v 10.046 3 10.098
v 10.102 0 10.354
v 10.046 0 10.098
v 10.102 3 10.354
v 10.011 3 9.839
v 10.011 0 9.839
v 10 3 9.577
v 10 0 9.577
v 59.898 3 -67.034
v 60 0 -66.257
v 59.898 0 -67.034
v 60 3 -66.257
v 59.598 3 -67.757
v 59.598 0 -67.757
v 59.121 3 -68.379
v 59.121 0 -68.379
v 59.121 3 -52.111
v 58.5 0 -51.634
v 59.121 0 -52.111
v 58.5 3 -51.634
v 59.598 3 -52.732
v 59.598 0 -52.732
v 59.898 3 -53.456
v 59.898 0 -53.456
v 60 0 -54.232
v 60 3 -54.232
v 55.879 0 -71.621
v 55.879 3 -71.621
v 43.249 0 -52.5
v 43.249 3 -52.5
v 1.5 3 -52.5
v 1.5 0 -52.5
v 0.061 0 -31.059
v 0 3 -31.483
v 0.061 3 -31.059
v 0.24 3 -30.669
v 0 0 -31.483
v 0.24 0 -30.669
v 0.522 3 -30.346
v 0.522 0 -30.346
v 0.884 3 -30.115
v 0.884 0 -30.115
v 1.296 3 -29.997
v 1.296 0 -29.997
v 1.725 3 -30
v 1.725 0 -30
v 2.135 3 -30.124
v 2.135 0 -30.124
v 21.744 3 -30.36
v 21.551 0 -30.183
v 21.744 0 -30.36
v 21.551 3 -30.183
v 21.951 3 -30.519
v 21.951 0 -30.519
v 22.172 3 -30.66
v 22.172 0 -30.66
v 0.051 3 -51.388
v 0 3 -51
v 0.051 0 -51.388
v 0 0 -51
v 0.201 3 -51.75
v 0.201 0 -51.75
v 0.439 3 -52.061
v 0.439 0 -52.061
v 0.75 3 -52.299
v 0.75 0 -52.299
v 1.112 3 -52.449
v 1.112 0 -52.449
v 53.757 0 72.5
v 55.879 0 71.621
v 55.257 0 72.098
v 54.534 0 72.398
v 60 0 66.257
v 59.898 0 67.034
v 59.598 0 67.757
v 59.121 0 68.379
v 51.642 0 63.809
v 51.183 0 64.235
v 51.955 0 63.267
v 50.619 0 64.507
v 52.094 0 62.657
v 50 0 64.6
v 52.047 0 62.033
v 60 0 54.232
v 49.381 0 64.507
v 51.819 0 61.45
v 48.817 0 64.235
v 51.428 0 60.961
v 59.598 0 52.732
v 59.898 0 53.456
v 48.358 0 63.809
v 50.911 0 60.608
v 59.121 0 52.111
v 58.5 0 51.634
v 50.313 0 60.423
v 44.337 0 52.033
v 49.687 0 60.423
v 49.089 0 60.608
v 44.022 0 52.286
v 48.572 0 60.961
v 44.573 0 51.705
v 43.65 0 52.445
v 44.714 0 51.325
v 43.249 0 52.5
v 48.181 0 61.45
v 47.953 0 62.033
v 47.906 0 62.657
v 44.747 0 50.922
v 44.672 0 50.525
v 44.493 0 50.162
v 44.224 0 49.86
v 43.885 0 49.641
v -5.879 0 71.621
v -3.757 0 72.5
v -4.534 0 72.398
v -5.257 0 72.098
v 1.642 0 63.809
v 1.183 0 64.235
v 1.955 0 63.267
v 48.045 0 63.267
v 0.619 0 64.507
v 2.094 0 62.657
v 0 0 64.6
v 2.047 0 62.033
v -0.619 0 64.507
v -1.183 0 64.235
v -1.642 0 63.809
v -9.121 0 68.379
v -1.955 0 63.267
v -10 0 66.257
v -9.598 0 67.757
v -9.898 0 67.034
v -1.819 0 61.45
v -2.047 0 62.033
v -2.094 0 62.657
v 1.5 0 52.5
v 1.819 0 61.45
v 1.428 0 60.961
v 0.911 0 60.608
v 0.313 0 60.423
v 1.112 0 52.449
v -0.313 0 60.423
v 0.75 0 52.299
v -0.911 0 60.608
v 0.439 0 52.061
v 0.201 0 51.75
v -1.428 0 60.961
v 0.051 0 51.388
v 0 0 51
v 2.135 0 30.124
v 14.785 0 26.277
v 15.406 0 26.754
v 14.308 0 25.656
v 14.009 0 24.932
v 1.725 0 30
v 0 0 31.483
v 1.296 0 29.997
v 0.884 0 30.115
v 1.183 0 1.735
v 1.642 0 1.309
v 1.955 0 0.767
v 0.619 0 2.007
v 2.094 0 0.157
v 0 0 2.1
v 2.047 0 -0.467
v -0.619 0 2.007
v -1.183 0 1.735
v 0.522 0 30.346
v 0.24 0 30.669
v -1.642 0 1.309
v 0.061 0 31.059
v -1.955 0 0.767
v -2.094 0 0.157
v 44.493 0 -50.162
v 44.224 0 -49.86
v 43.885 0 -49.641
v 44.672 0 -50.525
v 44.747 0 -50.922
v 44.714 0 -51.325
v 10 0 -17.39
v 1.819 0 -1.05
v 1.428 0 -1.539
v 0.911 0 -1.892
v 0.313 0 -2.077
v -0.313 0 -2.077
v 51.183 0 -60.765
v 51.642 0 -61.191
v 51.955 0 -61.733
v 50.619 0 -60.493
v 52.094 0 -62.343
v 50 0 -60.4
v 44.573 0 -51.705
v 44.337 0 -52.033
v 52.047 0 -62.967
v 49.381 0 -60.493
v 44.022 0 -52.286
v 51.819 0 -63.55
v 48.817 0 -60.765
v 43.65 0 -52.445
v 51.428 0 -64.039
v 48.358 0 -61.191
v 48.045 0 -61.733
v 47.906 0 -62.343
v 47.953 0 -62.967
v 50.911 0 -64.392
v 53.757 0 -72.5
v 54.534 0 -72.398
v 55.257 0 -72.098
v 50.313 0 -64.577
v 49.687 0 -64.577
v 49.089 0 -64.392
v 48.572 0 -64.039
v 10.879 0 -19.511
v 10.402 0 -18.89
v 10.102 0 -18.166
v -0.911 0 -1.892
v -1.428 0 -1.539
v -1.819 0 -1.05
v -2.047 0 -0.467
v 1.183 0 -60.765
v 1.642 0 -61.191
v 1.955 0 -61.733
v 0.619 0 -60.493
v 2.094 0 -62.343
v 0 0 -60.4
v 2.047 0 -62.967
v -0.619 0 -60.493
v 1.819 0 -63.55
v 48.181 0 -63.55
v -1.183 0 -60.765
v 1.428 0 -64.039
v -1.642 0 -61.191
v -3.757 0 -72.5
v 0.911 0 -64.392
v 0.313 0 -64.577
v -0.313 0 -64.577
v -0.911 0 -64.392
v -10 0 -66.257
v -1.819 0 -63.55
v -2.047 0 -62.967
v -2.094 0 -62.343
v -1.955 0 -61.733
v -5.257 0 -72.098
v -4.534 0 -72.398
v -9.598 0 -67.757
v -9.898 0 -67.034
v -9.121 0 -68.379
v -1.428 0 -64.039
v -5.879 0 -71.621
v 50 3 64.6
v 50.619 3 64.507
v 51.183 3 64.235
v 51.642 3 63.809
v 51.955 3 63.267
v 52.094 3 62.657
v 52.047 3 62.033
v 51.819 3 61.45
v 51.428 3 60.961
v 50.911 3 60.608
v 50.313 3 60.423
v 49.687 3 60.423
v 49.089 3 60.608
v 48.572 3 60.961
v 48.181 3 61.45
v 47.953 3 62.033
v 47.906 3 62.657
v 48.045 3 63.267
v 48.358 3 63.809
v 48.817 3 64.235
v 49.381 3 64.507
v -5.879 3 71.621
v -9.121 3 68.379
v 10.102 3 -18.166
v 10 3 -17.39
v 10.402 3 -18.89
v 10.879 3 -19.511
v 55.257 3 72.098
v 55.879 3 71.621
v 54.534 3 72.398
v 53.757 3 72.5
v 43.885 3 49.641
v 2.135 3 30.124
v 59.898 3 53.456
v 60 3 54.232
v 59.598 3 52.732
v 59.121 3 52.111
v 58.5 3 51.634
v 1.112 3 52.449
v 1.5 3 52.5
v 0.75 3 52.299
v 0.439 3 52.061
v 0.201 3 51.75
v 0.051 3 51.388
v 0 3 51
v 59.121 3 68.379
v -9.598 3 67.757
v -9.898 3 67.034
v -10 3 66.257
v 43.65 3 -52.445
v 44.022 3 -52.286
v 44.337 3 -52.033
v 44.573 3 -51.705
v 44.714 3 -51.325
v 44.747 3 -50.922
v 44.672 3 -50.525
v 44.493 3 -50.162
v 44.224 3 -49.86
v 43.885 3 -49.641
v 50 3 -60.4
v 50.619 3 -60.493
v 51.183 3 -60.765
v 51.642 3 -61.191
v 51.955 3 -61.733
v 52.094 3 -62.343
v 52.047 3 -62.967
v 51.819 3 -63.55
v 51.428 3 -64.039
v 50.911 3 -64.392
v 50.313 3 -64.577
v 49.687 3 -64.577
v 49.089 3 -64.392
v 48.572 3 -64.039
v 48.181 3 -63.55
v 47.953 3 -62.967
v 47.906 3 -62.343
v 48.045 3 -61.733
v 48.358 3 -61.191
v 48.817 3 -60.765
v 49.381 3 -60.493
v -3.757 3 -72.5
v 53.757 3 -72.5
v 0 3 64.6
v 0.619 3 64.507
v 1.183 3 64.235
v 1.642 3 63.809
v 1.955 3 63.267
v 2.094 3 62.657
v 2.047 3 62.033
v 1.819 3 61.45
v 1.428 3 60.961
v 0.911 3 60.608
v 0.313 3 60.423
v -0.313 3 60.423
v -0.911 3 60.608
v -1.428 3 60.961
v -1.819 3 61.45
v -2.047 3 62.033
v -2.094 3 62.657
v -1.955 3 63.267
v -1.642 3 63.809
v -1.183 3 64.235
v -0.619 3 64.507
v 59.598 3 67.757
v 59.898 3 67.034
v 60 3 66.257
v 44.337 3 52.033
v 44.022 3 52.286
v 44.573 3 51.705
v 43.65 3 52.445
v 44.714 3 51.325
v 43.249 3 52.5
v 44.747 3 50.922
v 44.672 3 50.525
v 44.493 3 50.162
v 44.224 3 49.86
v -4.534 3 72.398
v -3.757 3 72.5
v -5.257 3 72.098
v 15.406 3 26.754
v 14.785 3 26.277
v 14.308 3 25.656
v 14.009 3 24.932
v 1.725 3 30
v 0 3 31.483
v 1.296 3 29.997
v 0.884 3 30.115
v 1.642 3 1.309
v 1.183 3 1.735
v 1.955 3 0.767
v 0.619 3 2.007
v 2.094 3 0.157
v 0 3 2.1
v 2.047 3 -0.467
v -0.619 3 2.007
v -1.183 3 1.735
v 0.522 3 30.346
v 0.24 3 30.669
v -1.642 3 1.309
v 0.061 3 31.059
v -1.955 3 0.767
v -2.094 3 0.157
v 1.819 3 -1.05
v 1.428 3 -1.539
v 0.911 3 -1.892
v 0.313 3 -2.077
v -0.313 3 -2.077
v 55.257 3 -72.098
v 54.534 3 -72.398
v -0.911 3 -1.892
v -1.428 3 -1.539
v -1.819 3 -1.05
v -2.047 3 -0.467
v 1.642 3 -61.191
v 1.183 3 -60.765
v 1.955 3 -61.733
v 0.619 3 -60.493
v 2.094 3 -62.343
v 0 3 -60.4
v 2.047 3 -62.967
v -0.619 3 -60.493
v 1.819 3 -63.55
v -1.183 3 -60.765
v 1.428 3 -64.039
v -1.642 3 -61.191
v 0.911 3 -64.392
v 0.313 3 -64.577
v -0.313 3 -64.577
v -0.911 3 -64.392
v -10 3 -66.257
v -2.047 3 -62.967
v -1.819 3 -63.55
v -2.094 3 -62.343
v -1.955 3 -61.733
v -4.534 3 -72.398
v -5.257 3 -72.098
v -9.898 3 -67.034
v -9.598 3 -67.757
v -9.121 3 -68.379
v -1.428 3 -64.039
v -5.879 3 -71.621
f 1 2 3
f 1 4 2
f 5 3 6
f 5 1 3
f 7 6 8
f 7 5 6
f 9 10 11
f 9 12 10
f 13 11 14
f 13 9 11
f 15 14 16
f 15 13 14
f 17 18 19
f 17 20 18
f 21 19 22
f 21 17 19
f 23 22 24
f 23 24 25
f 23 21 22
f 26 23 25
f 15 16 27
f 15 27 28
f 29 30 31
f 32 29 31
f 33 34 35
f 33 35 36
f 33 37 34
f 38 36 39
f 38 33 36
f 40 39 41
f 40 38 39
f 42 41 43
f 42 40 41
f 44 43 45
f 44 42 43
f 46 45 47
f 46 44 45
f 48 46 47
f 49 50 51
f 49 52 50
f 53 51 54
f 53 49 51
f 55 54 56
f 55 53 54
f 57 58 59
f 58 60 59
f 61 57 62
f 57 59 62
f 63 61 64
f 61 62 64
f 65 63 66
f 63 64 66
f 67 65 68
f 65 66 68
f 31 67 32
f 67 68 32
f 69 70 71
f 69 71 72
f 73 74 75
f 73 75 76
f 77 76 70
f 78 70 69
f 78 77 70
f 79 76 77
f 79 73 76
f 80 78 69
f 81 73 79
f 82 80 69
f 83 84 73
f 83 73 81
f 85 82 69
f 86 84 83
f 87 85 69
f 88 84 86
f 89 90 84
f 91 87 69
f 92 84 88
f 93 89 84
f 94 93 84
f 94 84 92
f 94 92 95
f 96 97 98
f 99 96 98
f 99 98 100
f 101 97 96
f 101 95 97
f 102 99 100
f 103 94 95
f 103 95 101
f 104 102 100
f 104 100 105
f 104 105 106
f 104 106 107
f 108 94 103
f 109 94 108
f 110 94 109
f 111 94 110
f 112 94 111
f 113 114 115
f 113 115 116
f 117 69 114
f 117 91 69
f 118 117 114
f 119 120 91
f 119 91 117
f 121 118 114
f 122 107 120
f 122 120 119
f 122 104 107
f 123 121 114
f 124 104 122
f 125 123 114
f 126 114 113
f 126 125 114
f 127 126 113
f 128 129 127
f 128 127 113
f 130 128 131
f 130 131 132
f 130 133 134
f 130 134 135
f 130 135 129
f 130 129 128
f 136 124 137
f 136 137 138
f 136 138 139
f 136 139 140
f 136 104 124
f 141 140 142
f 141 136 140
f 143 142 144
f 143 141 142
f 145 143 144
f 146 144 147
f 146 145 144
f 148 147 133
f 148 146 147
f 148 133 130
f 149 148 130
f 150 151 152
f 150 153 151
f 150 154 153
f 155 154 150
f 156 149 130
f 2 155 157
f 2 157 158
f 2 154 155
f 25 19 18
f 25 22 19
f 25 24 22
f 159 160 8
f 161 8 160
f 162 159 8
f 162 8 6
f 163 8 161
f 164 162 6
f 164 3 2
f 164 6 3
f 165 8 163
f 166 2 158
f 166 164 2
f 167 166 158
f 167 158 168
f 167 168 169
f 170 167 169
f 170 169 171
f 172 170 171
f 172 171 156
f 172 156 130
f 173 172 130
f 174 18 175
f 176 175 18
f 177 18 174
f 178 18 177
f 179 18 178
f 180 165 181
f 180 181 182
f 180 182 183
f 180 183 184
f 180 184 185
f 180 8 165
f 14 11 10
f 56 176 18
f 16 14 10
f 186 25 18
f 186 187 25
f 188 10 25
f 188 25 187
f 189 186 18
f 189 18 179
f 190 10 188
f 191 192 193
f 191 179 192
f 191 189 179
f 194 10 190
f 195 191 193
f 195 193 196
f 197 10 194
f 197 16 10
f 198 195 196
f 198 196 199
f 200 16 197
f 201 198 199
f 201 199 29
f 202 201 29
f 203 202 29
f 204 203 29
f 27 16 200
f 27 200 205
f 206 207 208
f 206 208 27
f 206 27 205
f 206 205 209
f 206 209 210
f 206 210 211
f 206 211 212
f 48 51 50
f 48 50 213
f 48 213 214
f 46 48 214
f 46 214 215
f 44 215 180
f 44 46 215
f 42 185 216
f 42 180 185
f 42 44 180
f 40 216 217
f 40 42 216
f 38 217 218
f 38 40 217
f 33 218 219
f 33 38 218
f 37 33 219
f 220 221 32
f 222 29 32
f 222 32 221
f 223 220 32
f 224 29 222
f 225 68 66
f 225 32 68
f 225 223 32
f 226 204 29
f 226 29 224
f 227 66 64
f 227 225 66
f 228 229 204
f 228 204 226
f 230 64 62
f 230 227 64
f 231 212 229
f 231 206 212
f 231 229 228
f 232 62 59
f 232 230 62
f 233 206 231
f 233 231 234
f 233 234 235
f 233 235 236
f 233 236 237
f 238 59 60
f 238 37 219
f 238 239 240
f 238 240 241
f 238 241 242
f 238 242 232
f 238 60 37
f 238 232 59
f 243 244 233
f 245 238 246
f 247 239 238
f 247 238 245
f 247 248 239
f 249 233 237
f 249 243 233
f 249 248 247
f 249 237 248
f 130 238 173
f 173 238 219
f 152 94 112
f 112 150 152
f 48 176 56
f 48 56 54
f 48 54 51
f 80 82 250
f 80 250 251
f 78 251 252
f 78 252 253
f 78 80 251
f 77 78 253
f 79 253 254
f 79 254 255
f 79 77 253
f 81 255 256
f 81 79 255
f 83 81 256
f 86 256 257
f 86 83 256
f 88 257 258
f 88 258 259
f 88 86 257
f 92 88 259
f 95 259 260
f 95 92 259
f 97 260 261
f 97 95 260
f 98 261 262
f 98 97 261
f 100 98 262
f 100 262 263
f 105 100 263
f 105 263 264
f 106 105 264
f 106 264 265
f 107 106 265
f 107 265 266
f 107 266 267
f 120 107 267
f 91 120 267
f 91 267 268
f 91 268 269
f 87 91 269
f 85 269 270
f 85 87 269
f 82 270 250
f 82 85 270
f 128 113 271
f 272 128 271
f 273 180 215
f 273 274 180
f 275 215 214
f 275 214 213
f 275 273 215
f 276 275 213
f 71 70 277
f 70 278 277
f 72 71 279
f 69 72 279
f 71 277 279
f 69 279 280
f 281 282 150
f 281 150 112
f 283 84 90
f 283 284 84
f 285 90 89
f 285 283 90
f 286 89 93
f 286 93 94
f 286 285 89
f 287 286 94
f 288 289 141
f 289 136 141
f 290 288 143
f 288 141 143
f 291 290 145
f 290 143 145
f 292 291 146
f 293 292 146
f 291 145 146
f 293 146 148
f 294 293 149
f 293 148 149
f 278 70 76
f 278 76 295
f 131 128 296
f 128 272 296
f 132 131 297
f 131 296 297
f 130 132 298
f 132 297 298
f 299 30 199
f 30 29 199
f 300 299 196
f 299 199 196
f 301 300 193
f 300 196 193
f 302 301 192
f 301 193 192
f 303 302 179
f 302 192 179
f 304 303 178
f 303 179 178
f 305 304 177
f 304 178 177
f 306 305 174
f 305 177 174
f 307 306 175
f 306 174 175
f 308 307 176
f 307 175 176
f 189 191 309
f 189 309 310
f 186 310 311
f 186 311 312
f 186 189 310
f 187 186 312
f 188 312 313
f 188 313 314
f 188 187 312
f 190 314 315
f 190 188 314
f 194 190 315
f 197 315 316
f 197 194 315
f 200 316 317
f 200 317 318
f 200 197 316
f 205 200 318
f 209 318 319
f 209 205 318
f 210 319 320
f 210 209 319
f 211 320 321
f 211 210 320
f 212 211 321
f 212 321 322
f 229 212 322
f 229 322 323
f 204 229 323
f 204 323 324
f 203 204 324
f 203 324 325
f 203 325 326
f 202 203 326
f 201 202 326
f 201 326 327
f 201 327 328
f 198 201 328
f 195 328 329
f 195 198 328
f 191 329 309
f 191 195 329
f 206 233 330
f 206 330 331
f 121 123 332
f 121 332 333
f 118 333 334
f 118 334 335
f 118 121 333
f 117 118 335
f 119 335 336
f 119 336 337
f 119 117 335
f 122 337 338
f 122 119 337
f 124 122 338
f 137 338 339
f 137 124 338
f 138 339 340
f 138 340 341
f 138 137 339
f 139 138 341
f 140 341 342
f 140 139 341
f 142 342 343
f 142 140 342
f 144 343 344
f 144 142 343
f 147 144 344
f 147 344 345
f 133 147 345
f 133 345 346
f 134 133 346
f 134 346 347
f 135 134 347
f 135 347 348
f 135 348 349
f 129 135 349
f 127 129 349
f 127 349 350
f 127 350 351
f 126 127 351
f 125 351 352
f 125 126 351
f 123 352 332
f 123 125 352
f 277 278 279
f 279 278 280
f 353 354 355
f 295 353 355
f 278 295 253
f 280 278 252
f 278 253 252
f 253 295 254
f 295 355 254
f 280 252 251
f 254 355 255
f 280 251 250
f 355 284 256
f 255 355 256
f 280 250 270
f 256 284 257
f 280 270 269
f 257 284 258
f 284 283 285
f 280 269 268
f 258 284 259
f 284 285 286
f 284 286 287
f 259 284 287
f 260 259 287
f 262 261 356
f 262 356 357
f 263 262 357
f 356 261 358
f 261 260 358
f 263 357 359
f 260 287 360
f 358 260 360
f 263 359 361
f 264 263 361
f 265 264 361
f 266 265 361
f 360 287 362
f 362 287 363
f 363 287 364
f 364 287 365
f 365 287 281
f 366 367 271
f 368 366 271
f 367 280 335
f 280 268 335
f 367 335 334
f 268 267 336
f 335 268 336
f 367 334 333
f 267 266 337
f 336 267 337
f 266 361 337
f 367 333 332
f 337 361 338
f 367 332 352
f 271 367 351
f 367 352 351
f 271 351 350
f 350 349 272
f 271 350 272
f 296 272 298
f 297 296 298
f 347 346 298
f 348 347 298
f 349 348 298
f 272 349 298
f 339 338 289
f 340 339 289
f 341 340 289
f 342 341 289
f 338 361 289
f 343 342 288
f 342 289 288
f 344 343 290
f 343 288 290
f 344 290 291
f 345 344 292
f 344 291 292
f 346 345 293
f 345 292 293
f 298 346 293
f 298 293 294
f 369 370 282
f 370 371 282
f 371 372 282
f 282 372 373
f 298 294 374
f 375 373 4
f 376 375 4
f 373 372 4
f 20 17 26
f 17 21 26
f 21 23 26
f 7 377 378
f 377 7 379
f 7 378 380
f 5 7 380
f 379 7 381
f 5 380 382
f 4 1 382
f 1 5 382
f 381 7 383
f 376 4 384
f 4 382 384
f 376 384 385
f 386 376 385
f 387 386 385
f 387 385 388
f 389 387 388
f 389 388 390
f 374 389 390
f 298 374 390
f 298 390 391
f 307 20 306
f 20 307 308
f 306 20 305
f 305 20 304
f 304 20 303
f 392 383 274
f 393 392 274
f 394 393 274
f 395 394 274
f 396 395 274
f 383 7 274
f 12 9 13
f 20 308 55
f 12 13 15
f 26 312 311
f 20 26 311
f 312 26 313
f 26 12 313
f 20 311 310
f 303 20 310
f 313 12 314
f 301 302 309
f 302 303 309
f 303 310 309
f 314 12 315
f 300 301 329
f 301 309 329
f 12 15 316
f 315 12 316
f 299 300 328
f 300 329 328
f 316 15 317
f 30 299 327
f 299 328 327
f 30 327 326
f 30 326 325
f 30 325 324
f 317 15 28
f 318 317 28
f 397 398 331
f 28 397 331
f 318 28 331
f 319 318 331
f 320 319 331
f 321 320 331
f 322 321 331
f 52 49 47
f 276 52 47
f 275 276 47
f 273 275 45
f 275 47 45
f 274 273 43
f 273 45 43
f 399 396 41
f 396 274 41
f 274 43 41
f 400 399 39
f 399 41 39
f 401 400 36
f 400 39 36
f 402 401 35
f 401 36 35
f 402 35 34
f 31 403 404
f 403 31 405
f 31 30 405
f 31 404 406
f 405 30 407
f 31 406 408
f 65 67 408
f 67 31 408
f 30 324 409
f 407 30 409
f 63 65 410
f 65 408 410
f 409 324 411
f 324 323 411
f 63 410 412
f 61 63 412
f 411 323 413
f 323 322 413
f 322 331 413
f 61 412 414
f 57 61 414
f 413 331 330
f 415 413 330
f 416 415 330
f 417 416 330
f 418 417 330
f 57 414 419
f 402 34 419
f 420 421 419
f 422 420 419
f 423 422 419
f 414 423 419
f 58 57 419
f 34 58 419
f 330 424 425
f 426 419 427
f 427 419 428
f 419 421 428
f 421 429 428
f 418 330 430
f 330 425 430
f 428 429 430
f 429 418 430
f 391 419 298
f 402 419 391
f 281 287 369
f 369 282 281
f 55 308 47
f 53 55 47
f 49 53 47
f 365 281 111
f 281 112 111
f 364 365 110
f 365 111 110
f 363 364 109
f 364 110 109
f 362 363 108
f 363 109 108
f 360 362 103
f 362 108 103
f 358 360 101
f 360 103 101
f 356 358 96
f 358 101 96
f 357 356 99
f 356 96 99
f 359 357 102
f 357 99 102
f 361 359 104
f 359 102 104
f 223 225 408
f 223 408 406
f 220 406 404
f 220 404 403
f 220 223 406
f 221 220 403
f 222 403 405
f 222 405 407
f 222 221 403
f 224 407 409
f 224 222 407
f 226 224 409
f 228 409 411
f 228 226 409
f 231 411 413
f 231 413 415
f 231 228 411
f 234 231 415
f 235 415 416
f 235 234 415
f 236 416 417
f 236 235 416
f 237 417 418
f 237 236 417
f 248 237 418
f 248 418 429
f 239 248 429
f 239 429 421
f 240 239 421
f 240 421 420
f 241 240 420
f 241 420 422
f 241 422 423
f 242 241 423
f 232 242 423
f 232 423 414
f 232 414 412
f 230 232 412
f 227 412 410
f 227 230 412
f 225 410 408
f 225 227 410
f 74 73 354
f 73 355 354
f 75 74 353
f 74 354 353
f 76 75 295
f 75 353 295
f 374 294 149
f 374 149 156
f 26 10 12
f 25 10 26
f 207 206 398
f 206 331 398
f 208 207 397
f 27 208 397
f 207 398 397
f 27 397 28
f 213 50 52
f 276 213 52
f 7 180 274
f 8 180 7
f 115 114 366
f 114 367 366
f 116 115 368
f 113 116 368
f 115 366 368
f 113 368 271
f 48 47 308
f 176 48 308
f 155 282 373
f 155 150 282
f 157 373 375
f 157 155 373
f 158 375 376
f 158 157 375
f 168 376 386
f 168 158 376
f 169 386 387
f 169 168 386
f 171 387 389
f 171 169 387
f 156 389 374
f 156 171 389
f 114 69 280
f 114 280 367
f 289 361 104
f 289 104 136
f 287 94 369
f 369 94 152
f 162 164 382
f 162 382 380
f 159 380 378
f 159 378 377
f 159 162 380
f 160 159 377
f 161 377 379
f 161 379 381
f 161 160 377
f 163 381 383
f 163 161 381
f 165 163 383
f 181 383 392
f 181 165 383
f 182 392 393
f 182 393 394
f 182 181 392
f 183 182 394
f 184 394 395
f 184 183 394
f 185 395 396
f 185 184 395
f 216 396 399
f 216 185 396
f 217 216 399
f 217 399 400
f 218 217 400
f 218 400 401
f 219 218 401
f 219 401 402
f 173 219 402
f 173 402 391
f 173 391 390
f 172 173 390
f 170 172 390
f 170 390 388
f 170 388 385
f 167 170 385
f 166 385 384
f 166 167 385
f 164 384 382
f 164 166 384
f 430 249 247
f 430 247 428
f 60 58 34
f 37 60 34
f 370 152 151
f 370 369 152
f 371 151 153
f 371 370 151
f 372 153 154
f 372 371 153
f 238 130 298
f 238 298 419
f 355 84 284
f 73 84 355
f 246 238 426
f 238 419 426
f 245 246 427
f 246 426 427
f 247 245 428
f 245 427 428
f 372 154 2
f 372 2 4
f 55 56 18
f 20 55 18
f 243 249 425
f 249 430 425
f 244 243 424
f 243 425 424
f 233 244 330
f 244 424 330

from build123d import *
from OCP.BRepFilletAPI import BRepFilletAPI_MakeChamfer

# Parameters (mm, degrees)
SKETCH_1_R          = 2.1
EXTRUDE_1_DEPTH     = 3
CHAMFER_1_SIZE      = 5
CHAMFER_1_SIZE2     = 13.660254038
FILLET_1_R          = 3
CUT_EXTRUDE_1_DEPTH = 10
FILLET_2_R          = 1.5


with BuildPart() as part:
    # 草图1 → 凸台-拉伸1 (new body)
    # profile 1 of 3: a face of its own
    with BuildSketch(Plane(origin=(0, 0, 0), x_dir=(1, 0, 0), z_dir=(0, 1, 0))):
        Polygon((10, 52.5), (10, 23.632486541), (60, 52.5), align=None)
    # profile 2 of 3: a face of its own
    with BuildSketch(Plane(origin=(0, 0, 0), x_dir=(1, 0, 0), z_dir=(0, 1, 0))):
        Polygon((10, -23.632486541), (10, -52.5), (60, -52.5), align=None)
    # profile 3 of 3: a face of its own
    with BuildSketch(Plane(origin=(0, 0, 0), x_dir=(1, 0, 0), z_dir=(0, 1, 0))):
        Polygon((60, -52.5), (60, -72.5), (-10, -72.5), (-10, 72.5), (60, 72.5), (60, 52.5), (10, 52.5), (10, -52.5), align=None)
        with Locations(Location((50, -62.5, 0), (0, 0, 270))):
            Circle(SKETCH_1_R, mode=Mode.SUBTRACT)
        with Locations(Location((0, 0, 0), (0, 0, 270))):
            Circle(SKETCH_1_R, mode=Mode.SUBTRACT)
        with Locations(Location((50, 62.5, 0), (0, 0, 270))):
            Circle(SKETCH_1_R, mode=Mode.SUBTRACT)
        with Locations(Location((0, 62.5, 0), (0, 0, 270))):
            Circle(SKETCH_1_R, mode=Mode.SUBTRACT)
        with Locations(Location((0, -62.5, 0), (0, 0, 270))):
            Circle(SKETCH_1_R, mode=Mode.SUBTRACT)
    extrude(amount=EXTRUDE_1_DEPTH)

    # 倒角1: one chamfer whose edges measure the first distance from different faces: ONE call of the kernel's chamfer builder (chamfer() names one face for all edges)
    chamfer_1_edges_1 = [part.edges().sort_by_distance(p)[0] for p in [
        (60, 1.5, 72.5),
        (-10, 1.5, 72.5),
        (-10, 1.5, -72.5),
        (60, 1.5, -72.5),
    ]]
    chamfer_1_edges_2 = [part.edges().sort_by_distance(p)[0] for p in [
        (10, 1.5, -23.632486541),
    ]]
    chamfer_1_side_2 = [part.faces().sort_by_distance(p)[0] for p in [
        (10, 1.5, 0),
    ]]
    chamfer_1_edges_3 = [part.edges().sort_by_distance(p)[0] for p in [
        (10, 1.5, 23.632486541),
    ]]
    chamfer_1_side_3 = [part.faces().sort_by_distance(p)[0] for p in [
        (35, 1.5, 38.06624327),
    ]]
    chamfer_1 = BRepFilletAPI_MakeChamfer(part.part.solid().wrapped)
    for e in chamfer_1_edges_1:
        chamfer_1.Add(CHAMFER_1_SIZE, e.wrapped)
    for e in chamfer_1_edges_2:
        chamfer_1.Add(CHAMFER_1_SIZE, CHAMFER_1_SIZE2, e.wrapped, chamfer_1_side_2[0].wrapped)  # the first distance lies on this face
    for e in chamfer_1_edges_3:
        chamfer_1.Add(CHAMFER_1_SIZE, CHAMFER_1_SIZE2, e.wrapped, chamfer_1_side_3[0].wrapped)  # the first distance lies on this face
    add(Compound.cast(chamfer_1.Shape()), mode=Mode.REPLACE)

    # 圆角1
    fillet_1_edges = [part.edges().sort_by_distance(p)[0] for p in [
        (60, 1.5, -52.5),
        (60, 1.5, 52.5),
        (60, 1.5, 67.5),
        (-5, 1.5, 72.5),
        (55, 1.5, 72.5),
        (-10, 1.5, -67.5),
        (-10, 1.5, 67.5),
        (10, 1.5, -18.632486541),
        (10, 1.5, 9.972232503),
        (14.330127019, 1.5, 26.132486541),
        (21.830127019, 1.5, -30.462613559),
        (-5, 1.5, -72.5),
        (55, 1.5, -72.5),
        (60, 1.5, -67.5),
    ]]
    fillet(fillet_1_edges, radius=FILLET_1_R)

    # 草图3 → 切除-拉伸1 (cut)
    with BuildSketch(Plane(origin=(0, 3, 0), x_dir=(1, 0, 0), z_dir=(0, 1, 0))):
        Polygon((0, -52.5), (0, -29.126059631), (50, -52.5), align=None)
        Polygon((0, 52.5), (0, 29.126059631), (50, 52.5), align=None)
    extrude(amount=-CUT_EXTRUDE_1_DEPTH, mode=Mode.SUBTRACT)

    # 圆角2
    fillet_2_edges = [part.edges().sort_by_distance(p)[0] for p in [
        (0, 1.5, 52.5),
        (0, 1.5, 29.126059631),
        (50, 1.5, 52.5),
        (0, 1.5, -52.5),
        (50, 1.5, -52.5),
        (0, 1.5, -29.126059631),
    ]]
    fillet(fillet_2_edges, radius=FILLET_2_R)


solid = part.part
